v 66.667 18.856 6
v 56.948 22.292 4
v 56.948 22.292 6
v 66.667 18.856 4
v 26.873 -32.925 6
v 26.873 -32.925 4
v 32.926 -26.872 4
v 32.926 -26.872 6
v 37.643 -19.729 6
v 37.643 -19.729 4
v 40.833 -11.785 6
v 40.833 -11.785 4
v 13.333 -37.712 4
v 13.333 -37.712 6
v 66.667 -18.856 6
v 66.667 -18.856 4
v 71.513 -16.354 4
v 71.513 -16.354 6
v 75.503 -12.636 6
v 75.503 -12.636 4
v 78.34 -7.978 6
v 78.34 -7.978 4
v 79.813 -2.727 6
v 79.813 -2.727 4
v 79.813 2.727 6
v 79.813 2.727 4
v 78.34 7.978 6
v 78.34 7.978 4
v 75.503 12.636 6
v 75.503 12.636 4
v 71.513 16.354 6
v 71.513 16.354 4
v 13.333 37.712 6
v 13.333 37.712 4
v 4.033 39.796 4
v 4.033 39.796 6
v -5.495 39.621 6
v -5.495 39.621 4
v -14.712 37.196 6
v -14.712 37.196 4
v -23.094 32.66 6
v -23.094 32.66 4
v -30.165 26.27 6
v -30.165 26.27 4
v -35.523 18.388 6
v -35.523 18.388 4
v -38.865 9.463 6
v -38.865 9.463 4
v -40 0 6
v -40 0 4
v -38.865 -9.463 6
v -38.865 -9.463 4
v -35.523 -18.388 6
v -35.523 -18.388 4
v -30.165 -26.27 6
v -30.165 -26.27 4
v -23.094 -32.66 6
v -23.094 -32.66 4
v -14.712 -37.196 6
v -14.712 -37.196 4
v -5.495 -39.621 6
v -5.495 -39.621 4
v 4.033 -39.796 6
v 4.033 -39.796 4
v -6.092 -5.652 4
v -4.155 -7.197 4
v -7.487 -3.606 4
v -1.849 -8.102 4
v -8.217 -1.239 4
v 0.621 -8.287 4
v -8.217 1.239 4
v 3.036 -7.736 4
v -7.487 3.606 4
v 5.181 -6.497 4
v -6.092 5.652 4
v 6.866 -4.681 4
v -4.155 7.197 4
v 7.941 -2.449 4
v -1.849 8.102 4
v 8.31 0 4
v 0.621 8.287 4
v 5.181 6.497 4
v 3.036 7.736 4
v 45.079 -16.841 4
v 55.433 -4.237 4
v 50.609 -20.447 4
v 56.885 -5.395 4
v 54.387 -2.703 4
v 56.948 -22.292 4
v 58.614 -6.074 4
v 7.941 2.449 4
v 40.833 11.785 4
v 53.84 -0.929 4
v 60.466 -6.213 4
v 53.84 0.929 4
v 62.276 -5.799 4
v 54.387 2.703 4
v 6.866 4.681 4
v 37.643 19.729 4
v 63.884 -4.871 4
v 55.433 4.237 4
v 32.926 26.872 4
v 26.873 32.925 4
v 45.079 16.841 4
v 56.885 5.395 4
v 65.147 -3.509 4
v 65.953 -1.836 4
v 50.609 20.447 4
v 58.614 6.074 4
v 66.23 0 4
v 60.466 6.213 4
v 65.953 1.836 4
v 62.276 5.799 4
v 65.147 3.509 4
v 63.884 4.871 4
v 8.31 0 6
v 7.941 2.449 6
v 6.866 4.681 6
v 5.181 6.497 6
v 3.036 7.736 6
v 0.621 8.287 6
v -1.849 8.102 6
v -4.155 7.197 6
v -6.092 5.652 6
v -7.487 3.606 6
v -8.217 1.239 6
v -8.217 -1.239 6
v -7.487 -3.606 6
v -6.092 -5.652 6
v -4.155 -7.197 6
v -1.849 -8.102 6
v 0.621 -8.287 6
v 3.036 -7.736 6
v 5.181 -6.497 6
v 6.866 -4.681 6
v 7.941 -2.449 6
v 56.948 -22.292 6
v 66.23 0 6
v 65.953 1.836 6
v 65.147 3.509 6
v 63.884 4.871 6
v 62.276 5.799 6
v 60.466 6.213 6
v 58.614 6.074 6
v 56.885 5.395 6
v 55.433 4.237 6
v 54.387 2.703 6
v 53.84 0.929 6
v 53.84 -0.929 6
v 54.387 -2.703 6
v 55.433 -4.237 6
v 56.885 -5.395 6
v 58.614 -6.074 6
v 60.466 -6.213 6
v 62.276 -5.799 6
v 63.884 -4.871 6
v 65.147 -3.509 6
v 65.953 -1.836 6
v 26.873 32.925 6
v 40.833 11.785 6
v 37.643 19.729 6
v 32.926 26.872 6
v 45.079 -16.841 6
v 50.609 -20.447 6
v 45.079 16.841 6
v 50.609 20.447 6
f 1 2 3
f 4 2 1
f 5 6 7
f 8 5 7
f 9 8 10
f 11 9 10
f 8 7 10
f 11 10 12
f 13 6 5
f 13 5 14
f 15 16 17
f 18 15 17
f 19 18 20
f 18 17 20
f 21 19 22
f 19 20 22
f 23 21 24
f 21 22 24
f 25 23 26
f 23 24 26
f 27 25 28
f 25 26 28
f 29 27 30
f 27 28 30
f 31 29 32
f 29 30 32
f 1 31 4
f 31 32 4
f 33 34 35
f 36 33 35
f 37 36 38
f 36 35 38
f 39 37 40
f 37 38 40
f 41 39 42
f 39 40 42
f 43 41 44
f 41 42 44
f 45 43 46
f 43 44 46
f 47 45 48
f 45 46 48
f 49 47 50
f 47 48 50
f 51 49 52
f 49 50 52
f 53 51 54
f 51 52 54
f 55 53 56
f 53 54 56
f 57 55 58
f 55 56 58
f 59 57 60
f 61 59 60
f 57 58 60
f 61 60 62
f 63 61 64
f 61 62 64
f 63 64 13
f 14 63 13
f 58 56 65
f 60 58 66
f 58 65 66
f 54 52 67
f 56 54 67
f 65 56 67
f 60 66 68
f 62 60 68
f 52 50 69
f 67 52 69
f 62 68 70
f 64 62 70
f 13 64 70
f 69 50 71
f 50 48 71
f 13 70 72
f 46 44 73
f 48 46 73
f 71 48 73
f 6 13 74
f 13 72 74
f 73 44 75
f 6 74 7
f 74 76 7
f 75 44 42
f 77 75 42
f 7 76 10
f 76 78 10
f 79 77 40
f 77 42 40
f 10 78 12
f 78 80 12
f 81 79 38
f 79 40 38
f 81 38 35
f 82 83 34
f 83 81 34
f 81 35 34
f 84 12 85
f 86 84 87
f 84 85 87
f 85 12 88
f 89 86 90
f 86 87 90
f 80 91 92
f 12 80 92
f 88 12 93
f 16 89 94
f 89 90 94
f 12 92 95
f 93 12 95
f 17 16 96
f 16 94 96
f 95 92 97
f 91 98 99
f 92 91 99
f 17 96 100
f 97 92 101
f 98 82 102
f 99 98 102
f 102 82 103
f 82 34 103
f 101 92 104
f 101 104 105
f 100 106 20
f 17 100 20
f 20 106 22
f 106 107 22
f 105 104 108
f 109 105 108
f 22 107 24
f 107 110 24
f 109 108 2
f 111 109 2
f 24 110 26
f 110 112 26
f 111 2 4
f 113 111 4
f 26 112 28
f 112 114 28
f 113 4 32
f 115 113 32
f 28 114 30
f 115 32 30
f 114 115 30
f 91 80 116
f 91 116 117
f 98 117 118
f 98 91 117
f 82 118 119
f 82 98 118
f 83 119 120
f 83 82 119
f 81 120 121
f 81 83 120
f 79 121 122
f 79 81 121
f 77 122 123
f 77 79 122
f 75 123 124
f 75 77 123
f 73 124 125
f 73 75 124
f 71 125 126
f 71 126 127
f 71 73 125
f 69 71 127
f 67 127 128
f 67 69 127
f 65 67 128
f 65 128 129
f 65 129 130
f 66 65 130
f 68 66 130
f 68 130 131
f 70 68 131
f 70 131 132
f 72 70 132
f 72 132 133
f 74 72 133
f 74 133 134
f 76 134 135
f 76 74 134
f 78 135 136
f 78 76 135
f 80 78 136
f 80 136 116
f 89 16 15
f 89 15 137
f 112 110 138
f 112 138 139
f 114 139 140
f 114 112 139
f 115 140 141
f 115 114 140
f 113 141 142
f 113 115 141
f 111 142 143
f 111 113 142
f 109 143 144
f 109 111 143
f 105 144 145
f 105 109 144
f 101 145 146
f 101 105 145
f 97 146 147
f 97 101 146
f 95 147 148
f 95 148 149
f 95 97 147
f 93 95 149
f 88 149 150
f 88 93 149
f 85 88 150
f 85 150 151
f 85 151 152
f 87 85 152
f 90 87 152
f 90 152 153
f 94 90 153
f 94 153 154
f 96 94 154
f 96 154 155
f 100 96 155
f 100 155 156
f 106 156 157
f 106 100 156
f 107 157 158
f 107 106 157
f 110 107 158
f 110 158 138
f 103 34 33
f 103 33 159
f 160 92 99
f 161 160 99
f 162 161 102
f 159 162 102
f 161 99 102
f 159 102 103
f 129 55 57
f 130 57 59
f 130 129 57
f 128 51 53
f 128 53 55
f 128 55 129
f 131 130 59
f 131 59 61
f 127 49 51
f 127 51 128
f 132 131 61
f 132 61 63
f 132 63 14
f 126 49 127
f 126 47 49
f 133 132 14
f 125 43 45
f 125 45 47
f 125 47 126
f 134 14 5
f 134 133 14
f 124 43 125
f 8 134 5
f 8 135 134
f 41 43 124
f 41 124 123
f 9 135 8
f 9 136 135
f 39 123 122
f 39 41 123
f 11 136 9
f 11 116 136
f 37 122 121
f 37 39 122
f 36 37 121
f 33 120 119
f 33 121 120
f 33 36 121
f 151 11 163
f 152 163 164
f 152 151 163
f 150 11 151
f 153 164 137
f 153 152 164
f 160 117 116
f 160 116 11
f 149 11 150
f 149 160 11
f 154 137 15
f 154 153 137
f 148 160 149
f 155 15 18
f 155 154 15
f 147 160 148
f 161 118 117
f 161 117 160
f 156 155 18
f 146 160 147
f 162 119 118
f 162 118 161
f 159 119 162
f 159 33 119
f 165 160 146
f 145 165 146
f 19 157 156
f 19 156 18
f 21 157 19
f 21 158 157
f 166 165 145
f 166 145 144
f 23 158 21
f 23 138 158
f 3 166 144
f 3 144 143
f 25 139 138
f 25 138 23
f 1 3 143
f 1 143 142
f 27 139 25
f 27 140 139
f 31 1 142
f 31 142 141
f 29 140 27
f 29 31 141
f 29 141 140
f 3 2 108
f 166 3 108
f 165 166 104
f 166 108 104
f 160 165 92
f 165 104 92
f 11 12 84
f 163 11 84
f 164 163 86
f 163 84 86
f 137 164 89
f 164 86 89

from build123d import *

# Parameters (mm, degrees)
EXTRUDE009_DEPTH = 4
SKETCH003_R      = 8.31
SKETCH003_R_2    = 6.23
EXTRUDE003_DEPTH = 2


with BuildPart() as juncao:
    # Sketch012 (on Face8 of Extrude002) → Extrude009 (new body)
    with BuildSketch(Plane.XY.offset(2)):
        with BuildLine():
            ThreePointArc((26.8733973411, -32.9252261245), (35.4651440174, -23.4195123738), (40.8333333333, -11.7851130198))
            ThreePointArc((40.8333333333, -11.7851130198), (47.7113101314, -18.8477611751), (56.9484135086, -22.2921021863))
            Line((56.9484135086, -22.2921021863), (26.8733973411, -32.9252261245))
        make_face()
        with BuildLine():
            ThreePointArc((56.9484135086, 22.2921021863), (47.7113101314, 18.8477611751), (40.8333333333, 11.7851130198))
            ThreePointArc((40.8333333333, 11.7851130198), (35.4651440174, 23.4195123738), (26.8733973411, 32.9252261245))
            Line((56.9484135086, 22.2921021863), (26.8733973411, 32.9252261245))
        make_face()
    extrude(amount=EXTRUDE009_DEPTH)


with BuildPart() as tampo:
    # Sketch003 (on Face5 of Cut) → Extrude003 (new body)
    with BuildSketch(Plane.XY.offset(4)):
        with BuildLine():
            ThreePointArc((13.3333333333, 37.7123616633), (-40, 0), (13.3333333333, -37.7123616633))
            Line((66.6666666667, -18.8561808316), (13.3333333333, -37.7123616633))
            ThreePointArc((66.6666666667, -18.8561808316), (80, 0), (66.6666666667, 18.8561808316))
            Line((13.3333333333, 37.7123616633), (66.6666666667, 18.8561808316))
        make_face()
        Circle(SKETCH003_R, mode=Mode.SUBTRACT)
        with Locations((60, 0)):
            Circle(SKETCH003_R_2, mode=Mode.SUBTRACT)
    extrude(amount=EXTRUDE003_DEPTH)

    # Cut003: cut Juncao
    add(juncao.part, mode=Mode.SUBTRACT)


solid = tampo.part
